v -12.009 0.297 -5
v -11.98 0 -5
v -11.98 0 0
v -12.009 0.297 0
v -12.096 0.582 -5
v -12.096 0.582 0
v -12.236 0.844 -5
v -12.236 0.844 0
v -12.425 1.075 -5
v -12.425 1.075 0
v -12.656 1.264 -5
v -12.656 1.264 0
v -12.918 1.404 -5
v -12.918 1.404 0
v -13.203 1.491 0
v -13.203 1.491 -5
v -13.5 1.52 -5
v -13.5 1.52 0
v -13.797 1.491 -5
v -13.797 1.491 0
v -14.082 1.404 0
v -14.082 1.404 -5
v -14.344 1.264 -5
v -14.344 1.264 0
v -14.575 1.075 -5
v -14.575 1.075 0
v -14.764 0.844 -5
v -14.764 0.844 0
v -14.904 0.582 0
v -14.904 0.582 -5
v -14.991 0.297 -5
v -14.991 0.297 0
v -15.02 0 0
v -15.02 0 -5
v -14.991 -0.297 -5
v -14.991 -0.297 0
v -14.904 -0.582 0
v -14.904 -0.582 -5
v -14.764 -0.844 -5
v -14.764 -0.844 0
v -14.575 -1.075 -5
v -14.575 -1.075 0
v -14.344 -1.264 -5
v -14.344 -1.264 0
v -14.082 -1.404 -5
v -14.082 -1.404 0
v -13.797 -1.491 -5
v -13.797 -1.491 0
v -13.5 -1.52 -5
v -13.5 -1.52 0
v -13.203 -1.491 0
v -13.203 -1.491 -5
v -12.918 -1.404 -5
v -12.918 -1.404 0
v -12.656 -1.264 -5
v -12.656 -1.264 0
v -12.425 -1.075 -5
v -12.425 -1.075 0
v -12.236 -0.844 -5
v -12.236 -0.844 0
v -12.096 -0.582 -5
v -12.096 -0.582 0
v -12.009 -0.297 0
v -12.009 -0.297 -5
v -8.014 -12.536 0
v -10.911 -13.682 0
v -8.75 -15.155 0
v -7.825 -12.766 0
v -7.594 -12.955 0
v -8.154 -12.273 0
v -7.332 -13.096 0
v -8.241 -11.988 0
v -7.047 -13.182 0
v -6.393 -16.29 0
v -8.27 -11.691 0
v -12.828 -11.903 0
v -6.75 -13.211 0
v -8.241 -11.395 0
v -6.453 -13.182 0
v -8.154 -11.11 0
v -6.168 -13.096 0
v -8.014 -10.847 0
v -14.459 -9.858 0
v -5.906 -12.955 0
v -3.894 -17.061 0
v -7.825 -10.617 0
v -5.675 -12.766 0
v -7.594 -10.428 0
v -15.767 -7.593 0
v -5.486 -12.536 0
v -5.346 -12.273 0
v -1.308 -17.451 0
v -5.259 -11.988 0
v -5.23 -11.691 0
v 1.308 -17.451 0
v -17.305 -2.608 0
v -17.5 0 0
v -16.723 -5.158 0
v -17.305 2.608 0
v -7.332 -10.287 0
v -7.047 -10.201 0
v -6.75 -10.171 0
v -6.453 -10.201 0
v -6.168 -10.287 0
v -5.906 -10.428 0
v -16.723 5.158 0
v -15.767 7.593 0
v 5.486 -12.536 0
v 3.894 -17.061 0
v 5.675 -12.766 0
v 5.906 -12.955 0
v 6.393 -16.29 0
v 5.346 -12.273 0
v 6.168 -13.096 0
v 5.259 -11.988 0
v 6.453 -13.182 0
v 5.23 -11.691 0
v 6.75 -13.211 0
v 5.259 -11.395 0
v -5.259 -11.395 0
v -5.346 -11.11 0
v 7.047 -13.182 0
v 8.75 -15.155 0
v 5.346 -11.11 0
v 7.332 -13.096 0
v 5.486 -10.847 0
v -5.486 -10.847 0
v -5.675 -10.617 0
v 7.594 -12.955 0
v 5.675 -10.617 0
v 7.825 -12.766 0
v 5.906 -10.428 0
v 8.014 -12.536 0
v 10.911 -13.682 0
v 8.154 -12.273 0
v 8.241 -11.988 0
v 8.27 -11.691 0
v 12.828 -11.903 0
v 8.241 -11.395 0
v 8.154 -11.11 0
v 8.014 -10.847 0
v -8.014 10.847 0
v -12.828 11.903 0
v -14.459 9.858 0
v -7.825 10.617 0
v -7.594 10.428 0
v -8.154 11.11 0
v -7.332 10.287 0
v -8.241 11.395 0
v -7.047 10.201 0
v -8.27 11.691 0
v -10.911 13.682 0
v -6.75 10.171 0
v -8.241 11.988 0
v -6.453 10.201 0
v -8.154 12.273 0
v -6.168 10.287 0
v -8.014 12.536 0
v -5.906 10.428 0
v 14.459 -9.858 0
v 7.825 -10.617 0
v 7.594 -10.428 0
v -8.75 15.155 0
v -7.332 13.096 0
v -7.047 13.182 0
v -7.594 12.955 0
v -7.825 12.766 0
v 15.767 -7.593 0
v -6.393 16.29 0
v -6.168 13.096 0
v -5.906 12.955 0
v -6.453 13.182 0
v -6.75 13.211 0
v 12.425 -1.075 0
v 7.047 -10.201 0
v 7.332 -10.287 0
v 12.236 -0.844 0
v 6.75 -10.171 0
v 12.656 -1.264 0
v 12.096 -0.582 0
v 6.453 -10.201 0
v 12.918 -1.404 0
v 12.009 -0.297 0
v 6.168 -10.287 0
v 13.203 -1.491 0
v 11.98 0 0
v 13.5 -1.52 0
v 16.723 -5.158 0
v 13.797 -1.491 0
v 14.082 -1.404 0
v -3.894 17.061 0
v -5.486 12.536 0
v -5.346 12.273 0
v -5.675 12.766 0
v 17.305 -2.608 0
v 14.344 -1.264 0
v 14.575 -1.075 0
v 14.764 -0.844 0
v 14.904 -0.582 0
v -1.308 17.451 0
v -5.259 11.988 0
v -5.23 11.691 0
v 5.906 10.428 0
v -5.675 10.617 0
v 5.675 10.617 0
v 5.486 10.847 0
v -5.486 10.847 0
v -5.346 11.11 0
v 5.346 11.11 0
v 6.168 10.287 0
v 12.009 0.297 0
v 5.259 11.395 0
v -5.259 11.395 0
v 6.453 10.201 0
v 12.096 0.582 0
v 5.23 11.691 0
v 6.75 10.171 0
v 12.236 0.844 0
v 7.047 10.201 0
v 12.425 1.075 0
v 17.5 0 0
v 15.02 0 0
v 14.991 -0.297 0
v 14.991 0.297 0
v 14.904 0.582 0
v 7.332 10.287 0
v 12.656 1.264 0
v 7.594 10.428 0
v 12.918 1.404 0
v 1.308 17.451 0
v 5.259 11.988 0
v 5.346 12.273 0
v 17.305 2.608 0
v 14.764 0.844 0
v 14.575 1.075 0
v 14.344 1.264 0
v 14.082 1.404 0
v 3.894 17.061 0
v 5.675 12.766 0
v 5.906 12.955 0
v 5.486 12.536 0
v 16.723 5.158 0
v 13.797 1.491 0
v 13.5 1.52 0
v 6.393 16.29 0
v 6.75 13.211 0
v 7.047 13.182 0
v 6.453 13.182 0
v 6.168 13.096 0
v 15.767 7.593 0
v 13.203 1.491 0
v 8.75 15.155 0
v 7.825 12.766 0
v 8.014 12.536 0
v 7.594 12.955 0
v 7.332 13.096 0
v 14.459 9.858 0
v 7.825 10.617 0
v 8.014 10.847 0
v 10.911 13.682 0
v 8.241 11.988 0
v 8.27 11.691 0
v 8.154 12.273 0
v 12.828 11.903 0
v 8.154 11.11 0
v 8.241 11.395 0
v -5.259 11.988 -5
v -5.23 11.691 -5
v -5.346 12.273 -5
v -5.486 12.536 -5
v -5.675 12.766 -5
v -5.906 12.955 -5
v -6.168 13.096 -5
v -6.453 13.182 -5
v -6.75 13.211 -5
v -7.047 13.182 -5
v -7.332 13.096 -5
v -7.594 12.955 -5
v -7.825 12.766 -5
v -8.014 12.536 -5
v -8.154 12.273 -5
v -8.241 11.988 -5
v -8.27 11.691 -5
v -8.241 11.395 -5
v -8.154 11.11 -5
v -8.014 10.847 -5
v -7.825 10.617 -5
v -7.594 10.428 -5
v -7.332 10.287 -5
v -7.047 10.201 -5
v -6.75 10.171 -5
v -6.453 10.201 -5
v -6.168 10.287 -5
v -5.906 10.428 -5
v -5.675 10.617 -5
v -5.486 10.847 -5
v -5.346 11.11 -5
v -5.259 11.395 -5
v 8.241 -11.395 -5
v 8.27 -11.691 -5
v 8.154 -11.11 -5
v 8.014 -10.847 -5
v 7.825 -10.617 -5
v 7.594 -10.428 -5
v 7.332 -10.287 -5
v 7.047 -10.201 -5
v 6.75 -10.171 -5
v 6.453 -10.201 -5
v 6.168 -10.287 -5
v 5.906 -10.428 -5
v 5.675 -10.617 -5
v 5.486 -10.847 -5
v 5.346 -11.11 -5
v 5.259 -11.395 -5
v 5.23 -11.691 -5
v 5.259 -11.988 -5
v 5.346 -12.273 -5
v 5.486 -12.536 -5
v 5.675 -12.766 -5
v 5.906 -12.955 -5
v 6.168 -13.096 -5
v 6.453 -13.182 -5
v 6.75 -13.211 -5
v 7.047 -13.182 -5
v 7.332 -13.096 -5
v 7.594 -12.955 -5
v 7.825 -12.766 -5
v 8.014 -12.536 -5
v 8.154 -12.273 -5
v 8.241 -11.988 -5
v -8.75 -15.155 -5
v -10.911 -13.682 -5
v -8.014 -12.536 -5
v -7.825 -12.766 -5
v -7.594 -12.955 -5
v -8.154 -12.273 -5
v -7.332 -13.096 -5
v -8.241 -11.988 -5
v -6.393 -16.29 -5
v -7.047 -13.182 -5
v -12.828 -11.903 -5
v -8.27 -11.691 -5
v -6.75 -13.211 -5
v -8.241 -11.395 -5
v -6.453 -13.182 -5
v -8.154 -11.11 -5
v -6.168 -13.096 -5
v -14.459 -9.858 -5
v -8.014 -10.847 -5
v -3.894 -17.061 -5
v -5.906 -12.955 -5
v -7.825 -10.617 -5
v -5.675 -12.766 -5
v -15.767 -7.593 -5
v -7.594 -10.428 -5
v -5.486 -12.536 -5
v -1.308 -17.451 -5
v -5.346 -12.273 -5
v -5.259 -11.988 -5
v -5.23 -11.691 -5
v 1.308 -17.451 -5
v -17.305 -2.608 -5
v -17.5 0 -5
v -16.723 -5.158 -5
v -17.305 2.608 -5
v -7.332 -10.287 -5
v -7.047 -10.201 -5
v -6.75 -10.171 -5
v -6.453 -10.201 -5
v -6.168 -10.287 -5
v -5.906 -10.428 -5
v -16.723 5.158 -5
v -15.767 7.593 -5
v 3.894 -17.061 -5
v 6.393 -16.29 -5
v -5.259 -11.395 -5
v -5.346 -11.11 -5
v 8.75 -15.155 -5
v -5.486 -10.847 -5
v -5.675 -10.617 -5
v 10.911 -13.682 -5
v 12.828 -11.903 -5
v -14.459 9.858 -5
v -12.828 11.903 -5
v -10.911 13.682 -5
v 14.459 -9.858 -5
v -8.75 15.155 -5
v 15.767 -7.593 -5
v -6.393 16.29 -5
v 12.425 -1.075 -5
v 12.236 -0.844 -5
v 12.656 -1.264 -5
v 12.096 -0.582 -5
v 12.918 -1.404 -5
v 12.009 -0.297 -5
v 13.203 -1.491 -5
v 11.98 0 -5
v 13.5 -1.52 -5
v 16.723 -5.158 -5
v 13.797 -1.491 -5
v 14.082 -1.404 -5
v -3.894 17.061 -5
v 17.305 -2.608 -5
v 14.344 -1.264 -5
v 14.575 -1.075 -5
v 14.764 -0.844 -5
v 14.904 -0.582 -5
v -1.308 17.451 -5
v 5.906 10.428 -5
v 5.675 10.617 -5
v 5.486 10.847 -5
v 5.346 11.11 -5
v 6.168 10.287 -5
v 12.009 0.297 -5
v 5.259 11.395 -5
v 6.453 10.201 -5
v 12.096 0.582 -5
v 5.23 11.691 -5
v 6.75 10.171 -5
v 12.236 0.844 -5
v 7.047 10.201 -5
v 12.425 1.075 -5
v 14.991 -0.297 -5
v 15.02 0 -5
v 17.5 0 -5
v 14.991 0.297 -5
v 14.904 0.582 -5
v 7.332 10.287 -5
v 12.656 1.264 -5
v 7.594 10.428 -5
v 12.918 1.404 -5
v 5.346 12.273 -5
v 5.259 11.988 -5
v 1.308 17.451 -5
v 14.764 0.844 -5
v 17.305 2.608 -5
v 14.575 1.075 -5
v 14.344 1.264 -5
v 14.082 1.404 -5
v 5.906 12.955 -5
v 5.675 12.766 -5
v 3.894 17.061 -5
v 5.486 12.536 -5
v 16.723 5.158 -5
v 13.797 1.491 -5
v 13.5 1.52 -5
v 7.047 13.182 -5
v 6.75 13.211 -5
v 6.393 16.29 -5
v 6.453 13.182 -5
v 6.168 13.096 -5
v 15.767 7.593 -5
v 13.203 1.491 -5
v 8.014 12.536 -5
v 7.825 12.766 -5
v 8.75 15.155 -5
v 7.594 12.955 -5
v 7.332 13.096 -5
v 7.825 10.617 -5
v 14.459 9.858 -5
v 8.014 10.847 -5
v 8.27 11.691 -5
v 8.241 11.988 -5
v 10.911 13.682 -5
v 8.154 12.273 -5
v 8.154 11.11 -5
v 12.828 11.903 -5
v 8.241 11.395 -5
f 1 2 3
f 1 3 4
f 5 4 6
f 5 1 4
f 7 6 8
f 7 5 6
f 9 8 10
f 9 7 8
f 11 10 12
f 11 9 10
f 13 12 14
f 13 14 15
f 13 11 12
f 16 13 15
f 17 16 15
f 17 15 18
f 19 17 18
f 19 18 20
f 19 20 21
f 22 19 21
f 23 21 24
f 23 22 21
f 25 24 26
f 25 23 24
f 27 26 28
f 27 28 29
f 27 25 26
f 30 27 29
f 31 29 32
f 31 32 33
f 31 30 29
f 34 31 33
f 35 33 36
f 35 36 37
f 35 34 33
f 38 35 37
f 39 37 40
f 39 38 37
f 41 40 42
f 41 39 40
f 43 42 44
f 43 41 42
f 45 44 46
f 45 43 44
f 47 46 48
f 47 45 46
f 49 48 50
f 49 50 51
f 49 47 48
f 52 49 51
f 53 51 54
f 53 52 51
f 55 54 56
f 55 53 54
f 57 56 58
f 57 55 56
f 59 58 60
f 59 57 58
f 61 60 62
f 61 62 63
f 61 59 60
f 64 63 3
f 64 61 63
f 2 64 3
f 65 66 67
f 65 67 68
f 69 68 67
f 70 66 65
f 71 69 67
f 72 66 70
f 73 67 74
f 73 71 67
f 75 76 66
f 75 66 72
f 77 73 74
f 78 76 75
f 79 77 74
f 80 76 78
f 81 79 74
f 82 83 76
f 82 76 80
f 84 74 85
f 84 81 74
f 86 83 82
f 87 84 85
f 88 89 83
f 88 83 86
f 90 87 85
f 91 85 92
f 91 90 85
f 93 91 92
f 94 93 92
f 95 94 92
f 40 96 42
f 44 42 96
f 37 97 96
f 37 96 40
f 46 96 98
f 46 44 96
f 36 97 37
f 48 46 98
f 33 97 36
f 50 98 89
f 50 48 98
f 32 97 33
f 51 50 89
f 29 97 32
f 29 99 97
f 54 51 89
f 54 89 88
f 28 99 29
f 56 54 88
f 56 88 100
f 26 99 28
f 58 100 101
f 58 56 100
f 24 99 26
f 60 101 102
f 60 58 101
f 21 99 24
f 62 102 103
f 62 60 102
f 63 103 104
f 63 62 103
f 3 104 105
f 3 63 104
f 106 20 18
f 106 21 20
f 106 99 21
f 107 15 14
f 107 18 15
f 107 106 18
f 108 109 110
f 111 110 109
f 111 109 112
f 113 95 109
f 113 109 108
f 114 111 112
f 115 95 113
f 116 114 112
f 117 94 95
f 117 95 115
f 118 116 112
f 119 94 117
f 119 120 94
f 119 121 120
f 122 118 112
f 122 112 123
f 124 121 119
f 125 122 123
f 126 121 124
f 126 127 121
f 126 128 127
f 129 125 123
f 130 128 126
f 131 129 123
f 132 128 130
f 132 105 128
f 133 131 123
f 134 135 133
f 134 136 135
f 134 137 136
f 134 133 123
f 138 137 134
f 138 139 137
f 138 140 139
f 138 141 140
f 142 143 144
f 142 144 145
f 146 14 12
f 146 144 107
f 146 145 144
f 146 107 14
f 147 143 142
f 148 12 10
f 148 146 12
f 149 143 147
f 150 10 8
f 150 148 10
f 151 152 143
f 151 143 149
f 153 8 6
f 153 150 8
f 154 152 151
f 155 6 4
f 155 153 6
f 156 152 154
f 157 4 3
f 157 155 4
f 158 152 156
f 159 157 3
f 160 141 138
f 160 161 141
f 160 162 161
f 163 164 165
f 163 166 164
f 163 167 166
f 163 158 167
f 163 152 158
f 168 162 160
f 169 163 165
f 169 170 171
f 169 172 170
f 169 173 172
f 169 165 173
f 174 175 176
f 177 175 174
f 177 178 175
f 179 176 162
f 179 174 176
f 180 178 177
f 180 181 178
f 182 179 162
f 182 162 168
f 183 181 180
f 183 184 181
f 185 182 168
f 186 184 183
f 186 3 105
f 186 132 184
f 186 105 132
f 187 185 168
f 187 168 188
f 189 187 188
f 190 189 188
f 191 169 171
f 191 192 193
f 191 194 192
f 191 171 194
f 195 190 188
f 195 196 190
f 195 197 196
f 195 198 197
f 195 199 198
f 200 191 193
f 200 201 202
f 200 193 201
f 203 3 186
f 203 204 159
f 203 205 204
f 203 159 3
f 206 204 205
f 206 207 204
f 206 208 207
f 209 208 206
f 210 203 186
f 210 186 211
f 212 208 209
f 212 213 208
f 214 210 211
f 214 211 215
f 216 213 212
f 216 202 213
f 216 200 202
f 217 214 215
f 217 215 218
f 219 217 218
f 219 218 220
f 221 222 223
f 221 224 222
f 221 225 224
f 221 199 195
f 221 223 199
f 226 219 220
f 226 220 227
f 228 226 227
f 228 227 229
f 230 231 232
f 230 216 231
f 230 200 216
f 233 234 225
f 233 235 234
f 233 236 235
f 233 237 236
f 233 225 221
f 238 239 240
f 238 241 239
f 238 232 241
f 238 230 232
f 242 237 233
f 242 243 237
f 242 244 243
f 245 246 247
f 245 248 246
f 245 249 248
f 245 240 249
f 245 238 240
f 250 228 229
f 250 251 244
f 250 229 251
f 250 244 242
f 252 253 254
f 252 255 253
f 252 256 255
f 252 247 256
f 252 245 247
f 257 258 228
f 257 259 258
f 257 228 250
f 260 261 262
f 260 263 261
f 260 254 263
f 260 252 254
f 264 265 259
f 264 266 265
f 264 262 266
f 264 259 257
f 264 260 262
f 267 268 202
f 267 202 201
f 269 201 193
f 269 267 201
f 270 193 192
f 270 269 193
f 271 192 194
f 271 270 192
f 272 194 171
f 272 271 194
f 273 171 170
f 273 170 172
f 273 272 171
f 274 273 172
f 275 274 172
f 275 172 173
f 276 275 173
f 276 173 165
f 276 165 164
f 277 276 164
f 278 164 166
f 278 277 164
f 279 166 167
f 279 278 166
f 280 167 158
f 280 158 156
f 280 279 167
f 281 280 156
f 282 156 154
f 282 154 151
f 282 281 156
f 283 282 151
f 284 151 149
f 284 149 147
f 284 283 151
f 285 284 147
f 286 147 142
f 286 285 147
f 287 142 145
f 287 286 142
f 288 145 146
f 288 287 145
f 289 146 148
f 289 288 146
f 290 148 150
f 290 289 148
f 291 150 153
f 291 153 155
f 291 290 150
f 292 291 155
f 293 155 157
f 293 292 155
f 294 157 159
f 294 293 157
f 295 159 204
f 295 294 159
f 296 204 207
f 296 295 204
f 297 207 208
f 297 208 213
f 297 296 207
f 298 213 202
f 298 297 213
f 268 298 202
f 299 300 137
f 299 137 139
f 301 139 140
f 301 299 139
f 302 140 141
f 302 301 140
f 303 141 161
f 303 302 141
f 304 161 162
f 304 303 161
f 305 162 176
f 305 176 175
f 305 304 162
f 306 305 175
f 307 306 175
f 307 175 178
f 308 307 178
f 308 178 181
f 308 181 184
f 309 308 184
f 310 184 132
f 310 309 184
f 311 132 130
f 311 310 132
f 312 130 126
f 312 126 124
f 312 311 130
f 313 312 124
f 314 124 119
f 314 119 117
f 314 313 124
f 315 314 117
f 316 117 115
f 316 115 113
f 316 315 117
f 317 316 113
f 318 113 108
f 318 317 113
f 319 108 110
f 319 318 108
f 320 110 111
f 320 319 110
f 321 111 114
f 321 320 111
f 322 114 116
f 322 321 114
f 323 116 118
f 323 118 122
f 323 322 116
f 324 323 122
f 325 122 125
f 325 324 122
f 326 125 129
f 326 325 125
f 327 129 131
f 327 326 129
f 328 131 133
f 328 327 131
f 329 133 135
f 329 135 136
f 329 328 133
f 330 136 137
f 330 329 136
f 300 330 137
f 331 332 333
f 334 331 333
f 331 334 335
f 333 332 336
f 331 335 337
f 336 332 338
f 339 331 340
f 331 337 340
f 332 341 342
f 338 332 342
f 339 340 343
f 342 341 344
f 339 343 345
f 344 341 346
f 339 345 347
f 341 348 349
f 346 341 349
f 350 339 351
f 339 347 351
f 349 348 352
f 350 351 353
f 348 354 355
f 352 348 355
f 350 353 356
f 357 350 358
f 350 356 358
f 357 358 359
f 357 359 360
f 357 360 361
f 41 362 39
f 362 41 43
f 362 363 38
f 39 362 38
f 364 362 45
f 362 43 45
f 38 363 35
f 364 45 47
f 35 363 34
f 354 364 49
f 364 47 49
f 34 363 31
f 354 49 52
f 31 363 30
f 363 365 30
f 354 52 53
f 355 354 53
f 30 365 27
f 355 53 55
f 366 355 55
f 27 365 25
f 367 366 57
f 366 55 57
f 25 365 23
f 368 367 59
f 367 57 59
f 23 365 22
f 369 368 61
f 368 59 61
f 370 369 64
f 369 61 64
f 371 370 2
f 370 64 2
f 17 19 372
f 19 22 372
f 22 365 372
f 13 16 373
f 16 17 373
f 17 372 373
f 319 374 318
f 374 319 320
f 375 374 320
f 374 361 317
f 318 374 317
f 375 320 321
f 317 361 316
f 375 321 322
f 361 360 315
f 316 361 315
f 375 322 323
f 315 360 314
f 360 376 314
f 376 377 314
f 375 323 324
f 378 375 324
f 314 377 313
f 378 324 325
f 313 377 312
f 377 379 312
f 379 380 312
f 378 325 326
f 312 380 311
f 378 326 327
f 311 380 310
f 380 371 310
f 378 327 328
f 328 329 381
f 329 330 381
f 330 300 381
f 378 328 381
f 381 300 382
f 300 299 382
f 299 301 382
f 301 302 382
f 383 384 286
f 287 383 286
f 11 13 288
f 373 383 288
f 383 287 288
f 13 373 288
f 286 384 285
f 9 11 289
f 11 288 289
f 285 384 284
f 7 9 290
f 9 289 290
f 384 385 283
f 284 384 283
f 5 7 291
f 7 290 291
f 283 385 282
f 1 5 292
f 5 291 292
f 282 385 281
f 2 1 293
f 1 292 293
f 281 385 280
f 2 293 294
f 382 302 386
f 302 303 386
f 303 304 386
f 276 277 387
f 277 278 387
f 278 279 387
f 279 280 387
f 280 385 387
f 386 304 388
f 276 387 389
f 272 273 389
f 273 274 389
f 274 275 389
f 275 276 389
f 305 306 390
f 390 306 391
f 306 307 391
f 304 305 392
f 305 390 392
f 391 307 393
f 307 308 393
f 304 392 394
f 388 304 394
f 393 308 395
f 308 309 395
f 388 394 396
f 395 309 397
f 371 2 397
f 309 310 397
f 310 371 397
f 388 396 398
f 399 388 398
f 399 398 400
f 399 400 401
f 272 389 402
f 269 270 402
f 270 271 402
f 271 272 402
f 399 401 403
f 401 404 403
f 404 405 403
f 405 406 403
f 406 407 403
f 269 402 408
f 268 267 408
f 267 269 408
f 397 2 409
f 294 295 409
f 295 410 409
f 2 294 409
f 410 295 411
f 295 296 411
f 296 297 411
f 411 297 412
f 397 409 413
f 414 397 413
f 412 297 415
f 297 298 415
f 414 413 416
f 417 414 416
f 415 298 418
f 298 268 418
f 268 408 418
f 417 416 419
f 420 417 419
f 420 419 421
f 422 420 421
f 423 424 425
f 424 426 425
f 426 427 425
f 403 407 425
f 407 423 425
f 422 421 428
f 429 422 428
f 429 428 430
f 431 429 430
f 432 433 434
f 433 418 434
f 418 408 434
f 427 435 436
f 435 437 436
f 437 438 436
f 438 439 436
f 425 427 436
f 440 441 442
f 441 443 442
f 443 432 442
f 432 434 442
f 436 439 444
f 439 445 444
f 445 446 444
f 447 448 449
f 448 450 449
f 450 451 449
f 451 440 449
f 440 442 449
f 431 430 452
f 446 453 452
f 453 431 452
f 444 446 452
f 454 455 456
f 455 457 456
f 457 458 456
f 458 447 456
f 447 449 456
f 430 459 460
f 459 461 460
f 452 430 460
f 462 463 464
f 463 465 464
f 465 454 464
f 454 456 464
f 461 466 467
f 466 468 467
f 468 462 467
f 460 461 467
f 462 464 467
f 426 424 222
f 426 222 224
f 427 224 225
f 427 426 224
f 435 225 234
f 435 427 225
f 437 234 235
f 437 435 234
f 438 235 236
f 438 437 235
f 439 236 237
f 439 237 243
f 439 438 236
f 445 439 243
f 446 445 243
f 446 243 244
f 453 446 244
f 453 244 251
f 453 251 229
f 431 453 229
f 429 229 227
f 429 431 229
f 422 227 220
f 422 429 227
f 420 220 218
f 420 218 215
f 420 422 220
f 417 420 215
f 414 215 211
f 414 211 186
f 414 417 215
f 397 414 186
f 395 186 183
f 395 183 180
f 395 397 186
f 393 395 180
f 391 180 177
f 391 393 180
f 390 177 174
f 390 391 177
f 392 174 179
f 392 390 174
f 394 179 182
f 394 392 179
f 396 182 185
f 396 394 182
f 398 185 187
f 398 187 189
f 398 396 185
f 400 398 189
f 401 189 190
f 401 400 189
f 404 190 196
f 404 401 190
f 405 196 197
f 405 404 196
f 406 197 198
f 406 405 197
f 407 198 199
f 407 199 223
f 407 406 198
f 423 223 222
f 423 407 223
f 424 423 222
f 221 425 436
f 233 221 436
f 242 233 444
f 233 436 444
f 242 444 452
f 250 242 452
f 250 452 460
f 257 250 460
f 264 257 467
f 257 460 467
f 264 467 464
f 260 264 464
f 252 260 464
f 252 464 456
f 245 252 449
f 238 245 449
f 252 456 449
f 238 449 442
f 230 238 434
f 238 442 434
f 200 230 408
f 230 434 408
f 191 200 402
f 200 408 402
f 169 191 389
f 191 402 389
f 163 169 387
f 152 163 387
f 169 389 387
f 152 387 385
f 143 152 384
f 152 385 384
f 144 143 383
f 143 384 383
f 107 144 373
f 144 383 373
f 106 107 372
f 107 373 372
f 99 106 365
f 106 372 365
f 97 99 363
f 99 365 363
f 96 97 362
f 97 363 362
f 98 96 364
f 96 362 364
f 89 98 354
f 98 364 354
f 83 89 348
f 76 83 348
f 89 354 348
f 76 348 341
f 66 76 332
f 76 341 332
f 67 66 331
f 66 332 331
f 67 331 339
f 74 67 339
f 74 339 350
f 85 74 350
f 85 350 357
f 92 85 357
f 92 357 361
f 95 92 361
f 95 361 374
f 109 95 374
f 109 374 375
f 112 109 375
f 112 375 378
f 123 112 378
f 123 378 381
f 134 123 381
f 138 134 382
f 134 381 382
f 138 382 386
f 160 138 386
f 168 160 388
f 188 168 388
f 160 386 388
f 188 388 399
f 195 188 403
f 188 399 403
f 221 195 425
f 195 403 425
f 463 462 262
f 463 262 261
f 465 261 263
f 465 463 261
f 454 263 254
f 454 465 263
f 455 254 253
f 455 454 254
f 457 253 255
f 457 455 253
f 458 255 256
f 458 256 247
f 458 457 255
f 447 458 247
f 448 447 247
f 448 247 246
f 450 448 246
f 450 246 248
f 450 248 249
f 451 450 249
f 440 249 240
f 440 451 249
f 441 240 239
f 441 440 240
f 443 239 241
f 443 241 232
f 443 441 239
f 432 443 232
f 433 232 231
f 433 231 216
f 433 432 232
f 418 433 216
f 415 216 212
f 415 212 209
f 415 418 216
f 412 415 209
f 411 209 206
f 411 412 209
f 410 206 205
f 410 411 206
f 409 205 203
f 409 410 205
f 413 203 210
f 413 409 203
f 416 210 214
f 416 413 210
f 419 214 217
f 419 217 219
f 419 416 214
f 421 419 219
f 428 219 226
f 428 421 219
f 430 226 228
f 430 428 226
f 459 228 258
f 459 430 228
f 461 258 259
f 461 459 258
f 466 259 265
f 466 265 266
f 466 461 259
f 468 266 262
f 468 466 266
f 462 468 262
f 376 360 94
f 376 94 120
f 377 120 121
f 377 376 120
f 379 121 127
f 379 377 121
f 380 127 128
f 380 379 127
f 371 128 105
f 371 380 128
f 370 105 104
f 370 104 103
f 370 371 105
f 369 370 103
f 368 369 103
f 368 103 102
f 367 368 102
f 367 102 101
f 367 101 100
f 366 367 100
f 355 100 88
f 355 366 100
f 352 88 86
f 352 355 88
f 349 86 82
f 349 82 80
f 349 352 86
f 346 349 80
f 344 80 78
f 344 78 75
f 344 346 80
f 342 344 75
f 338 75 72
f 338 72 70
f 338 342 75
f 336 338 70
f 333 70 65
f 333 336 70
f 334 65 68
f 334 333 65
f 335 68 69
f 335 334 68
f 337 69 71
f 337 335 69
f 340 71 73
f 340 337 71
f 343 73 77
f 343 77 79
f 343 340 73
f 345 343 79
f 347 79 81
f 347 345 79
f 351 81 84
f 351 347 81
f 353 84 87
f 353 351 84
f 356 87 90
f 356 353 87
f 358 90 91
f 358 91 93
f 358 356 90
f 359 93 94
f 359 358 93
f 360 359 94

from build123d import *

# Parameters (mm, degrees)
ROTATING_OUTPUT_INTERFACE_START = -5
PROFILE_1_R                     = 17.5
PROFILE_1_R_2                   = 1.52
ROTATING_OUTPUT_INTERFACE_DEPTH = 5


with BuildPart() as part:
    # Profile_1 → Rotating_output_interface (new body)
    with BuildSketch(Plane.XY.offset(ROTATING_OUTPUT_INTERFACE_START)):
        Circle(PROFILE_1_R)
        with Locations((13.5, 0)):
            Circle(PROFILE_1_R_2, mode=Mode.SUBTRACT)
        with Locations((6.75, 11.691342951)):
            Circle(PROFILE_1_R_2, mode=Mode.SUBTRACT)
        with Locations((-6.75, 11.691342951)):
            Circle(PROFILE_1_R_2, mode=Mode.SUBTRACT)
        with Locations((-13.5, 0)):
            Circle(PROFILE_1_R_2, mode=Mode.SUBTRACT)
        with Locations((-6.75, -11.691342951)):
            Circle(PROFILE_1_R_2, mode=Mode.SUBTRACT)
        with Locations((6.75, -11.691342951)):
            Circle(PROFILE_1_R_2, mode=Mode.SUBTRACT)
    extrude(amount=ROTATING_OUTPUT_INTERFACE_DEPTH)


solid = part.part
